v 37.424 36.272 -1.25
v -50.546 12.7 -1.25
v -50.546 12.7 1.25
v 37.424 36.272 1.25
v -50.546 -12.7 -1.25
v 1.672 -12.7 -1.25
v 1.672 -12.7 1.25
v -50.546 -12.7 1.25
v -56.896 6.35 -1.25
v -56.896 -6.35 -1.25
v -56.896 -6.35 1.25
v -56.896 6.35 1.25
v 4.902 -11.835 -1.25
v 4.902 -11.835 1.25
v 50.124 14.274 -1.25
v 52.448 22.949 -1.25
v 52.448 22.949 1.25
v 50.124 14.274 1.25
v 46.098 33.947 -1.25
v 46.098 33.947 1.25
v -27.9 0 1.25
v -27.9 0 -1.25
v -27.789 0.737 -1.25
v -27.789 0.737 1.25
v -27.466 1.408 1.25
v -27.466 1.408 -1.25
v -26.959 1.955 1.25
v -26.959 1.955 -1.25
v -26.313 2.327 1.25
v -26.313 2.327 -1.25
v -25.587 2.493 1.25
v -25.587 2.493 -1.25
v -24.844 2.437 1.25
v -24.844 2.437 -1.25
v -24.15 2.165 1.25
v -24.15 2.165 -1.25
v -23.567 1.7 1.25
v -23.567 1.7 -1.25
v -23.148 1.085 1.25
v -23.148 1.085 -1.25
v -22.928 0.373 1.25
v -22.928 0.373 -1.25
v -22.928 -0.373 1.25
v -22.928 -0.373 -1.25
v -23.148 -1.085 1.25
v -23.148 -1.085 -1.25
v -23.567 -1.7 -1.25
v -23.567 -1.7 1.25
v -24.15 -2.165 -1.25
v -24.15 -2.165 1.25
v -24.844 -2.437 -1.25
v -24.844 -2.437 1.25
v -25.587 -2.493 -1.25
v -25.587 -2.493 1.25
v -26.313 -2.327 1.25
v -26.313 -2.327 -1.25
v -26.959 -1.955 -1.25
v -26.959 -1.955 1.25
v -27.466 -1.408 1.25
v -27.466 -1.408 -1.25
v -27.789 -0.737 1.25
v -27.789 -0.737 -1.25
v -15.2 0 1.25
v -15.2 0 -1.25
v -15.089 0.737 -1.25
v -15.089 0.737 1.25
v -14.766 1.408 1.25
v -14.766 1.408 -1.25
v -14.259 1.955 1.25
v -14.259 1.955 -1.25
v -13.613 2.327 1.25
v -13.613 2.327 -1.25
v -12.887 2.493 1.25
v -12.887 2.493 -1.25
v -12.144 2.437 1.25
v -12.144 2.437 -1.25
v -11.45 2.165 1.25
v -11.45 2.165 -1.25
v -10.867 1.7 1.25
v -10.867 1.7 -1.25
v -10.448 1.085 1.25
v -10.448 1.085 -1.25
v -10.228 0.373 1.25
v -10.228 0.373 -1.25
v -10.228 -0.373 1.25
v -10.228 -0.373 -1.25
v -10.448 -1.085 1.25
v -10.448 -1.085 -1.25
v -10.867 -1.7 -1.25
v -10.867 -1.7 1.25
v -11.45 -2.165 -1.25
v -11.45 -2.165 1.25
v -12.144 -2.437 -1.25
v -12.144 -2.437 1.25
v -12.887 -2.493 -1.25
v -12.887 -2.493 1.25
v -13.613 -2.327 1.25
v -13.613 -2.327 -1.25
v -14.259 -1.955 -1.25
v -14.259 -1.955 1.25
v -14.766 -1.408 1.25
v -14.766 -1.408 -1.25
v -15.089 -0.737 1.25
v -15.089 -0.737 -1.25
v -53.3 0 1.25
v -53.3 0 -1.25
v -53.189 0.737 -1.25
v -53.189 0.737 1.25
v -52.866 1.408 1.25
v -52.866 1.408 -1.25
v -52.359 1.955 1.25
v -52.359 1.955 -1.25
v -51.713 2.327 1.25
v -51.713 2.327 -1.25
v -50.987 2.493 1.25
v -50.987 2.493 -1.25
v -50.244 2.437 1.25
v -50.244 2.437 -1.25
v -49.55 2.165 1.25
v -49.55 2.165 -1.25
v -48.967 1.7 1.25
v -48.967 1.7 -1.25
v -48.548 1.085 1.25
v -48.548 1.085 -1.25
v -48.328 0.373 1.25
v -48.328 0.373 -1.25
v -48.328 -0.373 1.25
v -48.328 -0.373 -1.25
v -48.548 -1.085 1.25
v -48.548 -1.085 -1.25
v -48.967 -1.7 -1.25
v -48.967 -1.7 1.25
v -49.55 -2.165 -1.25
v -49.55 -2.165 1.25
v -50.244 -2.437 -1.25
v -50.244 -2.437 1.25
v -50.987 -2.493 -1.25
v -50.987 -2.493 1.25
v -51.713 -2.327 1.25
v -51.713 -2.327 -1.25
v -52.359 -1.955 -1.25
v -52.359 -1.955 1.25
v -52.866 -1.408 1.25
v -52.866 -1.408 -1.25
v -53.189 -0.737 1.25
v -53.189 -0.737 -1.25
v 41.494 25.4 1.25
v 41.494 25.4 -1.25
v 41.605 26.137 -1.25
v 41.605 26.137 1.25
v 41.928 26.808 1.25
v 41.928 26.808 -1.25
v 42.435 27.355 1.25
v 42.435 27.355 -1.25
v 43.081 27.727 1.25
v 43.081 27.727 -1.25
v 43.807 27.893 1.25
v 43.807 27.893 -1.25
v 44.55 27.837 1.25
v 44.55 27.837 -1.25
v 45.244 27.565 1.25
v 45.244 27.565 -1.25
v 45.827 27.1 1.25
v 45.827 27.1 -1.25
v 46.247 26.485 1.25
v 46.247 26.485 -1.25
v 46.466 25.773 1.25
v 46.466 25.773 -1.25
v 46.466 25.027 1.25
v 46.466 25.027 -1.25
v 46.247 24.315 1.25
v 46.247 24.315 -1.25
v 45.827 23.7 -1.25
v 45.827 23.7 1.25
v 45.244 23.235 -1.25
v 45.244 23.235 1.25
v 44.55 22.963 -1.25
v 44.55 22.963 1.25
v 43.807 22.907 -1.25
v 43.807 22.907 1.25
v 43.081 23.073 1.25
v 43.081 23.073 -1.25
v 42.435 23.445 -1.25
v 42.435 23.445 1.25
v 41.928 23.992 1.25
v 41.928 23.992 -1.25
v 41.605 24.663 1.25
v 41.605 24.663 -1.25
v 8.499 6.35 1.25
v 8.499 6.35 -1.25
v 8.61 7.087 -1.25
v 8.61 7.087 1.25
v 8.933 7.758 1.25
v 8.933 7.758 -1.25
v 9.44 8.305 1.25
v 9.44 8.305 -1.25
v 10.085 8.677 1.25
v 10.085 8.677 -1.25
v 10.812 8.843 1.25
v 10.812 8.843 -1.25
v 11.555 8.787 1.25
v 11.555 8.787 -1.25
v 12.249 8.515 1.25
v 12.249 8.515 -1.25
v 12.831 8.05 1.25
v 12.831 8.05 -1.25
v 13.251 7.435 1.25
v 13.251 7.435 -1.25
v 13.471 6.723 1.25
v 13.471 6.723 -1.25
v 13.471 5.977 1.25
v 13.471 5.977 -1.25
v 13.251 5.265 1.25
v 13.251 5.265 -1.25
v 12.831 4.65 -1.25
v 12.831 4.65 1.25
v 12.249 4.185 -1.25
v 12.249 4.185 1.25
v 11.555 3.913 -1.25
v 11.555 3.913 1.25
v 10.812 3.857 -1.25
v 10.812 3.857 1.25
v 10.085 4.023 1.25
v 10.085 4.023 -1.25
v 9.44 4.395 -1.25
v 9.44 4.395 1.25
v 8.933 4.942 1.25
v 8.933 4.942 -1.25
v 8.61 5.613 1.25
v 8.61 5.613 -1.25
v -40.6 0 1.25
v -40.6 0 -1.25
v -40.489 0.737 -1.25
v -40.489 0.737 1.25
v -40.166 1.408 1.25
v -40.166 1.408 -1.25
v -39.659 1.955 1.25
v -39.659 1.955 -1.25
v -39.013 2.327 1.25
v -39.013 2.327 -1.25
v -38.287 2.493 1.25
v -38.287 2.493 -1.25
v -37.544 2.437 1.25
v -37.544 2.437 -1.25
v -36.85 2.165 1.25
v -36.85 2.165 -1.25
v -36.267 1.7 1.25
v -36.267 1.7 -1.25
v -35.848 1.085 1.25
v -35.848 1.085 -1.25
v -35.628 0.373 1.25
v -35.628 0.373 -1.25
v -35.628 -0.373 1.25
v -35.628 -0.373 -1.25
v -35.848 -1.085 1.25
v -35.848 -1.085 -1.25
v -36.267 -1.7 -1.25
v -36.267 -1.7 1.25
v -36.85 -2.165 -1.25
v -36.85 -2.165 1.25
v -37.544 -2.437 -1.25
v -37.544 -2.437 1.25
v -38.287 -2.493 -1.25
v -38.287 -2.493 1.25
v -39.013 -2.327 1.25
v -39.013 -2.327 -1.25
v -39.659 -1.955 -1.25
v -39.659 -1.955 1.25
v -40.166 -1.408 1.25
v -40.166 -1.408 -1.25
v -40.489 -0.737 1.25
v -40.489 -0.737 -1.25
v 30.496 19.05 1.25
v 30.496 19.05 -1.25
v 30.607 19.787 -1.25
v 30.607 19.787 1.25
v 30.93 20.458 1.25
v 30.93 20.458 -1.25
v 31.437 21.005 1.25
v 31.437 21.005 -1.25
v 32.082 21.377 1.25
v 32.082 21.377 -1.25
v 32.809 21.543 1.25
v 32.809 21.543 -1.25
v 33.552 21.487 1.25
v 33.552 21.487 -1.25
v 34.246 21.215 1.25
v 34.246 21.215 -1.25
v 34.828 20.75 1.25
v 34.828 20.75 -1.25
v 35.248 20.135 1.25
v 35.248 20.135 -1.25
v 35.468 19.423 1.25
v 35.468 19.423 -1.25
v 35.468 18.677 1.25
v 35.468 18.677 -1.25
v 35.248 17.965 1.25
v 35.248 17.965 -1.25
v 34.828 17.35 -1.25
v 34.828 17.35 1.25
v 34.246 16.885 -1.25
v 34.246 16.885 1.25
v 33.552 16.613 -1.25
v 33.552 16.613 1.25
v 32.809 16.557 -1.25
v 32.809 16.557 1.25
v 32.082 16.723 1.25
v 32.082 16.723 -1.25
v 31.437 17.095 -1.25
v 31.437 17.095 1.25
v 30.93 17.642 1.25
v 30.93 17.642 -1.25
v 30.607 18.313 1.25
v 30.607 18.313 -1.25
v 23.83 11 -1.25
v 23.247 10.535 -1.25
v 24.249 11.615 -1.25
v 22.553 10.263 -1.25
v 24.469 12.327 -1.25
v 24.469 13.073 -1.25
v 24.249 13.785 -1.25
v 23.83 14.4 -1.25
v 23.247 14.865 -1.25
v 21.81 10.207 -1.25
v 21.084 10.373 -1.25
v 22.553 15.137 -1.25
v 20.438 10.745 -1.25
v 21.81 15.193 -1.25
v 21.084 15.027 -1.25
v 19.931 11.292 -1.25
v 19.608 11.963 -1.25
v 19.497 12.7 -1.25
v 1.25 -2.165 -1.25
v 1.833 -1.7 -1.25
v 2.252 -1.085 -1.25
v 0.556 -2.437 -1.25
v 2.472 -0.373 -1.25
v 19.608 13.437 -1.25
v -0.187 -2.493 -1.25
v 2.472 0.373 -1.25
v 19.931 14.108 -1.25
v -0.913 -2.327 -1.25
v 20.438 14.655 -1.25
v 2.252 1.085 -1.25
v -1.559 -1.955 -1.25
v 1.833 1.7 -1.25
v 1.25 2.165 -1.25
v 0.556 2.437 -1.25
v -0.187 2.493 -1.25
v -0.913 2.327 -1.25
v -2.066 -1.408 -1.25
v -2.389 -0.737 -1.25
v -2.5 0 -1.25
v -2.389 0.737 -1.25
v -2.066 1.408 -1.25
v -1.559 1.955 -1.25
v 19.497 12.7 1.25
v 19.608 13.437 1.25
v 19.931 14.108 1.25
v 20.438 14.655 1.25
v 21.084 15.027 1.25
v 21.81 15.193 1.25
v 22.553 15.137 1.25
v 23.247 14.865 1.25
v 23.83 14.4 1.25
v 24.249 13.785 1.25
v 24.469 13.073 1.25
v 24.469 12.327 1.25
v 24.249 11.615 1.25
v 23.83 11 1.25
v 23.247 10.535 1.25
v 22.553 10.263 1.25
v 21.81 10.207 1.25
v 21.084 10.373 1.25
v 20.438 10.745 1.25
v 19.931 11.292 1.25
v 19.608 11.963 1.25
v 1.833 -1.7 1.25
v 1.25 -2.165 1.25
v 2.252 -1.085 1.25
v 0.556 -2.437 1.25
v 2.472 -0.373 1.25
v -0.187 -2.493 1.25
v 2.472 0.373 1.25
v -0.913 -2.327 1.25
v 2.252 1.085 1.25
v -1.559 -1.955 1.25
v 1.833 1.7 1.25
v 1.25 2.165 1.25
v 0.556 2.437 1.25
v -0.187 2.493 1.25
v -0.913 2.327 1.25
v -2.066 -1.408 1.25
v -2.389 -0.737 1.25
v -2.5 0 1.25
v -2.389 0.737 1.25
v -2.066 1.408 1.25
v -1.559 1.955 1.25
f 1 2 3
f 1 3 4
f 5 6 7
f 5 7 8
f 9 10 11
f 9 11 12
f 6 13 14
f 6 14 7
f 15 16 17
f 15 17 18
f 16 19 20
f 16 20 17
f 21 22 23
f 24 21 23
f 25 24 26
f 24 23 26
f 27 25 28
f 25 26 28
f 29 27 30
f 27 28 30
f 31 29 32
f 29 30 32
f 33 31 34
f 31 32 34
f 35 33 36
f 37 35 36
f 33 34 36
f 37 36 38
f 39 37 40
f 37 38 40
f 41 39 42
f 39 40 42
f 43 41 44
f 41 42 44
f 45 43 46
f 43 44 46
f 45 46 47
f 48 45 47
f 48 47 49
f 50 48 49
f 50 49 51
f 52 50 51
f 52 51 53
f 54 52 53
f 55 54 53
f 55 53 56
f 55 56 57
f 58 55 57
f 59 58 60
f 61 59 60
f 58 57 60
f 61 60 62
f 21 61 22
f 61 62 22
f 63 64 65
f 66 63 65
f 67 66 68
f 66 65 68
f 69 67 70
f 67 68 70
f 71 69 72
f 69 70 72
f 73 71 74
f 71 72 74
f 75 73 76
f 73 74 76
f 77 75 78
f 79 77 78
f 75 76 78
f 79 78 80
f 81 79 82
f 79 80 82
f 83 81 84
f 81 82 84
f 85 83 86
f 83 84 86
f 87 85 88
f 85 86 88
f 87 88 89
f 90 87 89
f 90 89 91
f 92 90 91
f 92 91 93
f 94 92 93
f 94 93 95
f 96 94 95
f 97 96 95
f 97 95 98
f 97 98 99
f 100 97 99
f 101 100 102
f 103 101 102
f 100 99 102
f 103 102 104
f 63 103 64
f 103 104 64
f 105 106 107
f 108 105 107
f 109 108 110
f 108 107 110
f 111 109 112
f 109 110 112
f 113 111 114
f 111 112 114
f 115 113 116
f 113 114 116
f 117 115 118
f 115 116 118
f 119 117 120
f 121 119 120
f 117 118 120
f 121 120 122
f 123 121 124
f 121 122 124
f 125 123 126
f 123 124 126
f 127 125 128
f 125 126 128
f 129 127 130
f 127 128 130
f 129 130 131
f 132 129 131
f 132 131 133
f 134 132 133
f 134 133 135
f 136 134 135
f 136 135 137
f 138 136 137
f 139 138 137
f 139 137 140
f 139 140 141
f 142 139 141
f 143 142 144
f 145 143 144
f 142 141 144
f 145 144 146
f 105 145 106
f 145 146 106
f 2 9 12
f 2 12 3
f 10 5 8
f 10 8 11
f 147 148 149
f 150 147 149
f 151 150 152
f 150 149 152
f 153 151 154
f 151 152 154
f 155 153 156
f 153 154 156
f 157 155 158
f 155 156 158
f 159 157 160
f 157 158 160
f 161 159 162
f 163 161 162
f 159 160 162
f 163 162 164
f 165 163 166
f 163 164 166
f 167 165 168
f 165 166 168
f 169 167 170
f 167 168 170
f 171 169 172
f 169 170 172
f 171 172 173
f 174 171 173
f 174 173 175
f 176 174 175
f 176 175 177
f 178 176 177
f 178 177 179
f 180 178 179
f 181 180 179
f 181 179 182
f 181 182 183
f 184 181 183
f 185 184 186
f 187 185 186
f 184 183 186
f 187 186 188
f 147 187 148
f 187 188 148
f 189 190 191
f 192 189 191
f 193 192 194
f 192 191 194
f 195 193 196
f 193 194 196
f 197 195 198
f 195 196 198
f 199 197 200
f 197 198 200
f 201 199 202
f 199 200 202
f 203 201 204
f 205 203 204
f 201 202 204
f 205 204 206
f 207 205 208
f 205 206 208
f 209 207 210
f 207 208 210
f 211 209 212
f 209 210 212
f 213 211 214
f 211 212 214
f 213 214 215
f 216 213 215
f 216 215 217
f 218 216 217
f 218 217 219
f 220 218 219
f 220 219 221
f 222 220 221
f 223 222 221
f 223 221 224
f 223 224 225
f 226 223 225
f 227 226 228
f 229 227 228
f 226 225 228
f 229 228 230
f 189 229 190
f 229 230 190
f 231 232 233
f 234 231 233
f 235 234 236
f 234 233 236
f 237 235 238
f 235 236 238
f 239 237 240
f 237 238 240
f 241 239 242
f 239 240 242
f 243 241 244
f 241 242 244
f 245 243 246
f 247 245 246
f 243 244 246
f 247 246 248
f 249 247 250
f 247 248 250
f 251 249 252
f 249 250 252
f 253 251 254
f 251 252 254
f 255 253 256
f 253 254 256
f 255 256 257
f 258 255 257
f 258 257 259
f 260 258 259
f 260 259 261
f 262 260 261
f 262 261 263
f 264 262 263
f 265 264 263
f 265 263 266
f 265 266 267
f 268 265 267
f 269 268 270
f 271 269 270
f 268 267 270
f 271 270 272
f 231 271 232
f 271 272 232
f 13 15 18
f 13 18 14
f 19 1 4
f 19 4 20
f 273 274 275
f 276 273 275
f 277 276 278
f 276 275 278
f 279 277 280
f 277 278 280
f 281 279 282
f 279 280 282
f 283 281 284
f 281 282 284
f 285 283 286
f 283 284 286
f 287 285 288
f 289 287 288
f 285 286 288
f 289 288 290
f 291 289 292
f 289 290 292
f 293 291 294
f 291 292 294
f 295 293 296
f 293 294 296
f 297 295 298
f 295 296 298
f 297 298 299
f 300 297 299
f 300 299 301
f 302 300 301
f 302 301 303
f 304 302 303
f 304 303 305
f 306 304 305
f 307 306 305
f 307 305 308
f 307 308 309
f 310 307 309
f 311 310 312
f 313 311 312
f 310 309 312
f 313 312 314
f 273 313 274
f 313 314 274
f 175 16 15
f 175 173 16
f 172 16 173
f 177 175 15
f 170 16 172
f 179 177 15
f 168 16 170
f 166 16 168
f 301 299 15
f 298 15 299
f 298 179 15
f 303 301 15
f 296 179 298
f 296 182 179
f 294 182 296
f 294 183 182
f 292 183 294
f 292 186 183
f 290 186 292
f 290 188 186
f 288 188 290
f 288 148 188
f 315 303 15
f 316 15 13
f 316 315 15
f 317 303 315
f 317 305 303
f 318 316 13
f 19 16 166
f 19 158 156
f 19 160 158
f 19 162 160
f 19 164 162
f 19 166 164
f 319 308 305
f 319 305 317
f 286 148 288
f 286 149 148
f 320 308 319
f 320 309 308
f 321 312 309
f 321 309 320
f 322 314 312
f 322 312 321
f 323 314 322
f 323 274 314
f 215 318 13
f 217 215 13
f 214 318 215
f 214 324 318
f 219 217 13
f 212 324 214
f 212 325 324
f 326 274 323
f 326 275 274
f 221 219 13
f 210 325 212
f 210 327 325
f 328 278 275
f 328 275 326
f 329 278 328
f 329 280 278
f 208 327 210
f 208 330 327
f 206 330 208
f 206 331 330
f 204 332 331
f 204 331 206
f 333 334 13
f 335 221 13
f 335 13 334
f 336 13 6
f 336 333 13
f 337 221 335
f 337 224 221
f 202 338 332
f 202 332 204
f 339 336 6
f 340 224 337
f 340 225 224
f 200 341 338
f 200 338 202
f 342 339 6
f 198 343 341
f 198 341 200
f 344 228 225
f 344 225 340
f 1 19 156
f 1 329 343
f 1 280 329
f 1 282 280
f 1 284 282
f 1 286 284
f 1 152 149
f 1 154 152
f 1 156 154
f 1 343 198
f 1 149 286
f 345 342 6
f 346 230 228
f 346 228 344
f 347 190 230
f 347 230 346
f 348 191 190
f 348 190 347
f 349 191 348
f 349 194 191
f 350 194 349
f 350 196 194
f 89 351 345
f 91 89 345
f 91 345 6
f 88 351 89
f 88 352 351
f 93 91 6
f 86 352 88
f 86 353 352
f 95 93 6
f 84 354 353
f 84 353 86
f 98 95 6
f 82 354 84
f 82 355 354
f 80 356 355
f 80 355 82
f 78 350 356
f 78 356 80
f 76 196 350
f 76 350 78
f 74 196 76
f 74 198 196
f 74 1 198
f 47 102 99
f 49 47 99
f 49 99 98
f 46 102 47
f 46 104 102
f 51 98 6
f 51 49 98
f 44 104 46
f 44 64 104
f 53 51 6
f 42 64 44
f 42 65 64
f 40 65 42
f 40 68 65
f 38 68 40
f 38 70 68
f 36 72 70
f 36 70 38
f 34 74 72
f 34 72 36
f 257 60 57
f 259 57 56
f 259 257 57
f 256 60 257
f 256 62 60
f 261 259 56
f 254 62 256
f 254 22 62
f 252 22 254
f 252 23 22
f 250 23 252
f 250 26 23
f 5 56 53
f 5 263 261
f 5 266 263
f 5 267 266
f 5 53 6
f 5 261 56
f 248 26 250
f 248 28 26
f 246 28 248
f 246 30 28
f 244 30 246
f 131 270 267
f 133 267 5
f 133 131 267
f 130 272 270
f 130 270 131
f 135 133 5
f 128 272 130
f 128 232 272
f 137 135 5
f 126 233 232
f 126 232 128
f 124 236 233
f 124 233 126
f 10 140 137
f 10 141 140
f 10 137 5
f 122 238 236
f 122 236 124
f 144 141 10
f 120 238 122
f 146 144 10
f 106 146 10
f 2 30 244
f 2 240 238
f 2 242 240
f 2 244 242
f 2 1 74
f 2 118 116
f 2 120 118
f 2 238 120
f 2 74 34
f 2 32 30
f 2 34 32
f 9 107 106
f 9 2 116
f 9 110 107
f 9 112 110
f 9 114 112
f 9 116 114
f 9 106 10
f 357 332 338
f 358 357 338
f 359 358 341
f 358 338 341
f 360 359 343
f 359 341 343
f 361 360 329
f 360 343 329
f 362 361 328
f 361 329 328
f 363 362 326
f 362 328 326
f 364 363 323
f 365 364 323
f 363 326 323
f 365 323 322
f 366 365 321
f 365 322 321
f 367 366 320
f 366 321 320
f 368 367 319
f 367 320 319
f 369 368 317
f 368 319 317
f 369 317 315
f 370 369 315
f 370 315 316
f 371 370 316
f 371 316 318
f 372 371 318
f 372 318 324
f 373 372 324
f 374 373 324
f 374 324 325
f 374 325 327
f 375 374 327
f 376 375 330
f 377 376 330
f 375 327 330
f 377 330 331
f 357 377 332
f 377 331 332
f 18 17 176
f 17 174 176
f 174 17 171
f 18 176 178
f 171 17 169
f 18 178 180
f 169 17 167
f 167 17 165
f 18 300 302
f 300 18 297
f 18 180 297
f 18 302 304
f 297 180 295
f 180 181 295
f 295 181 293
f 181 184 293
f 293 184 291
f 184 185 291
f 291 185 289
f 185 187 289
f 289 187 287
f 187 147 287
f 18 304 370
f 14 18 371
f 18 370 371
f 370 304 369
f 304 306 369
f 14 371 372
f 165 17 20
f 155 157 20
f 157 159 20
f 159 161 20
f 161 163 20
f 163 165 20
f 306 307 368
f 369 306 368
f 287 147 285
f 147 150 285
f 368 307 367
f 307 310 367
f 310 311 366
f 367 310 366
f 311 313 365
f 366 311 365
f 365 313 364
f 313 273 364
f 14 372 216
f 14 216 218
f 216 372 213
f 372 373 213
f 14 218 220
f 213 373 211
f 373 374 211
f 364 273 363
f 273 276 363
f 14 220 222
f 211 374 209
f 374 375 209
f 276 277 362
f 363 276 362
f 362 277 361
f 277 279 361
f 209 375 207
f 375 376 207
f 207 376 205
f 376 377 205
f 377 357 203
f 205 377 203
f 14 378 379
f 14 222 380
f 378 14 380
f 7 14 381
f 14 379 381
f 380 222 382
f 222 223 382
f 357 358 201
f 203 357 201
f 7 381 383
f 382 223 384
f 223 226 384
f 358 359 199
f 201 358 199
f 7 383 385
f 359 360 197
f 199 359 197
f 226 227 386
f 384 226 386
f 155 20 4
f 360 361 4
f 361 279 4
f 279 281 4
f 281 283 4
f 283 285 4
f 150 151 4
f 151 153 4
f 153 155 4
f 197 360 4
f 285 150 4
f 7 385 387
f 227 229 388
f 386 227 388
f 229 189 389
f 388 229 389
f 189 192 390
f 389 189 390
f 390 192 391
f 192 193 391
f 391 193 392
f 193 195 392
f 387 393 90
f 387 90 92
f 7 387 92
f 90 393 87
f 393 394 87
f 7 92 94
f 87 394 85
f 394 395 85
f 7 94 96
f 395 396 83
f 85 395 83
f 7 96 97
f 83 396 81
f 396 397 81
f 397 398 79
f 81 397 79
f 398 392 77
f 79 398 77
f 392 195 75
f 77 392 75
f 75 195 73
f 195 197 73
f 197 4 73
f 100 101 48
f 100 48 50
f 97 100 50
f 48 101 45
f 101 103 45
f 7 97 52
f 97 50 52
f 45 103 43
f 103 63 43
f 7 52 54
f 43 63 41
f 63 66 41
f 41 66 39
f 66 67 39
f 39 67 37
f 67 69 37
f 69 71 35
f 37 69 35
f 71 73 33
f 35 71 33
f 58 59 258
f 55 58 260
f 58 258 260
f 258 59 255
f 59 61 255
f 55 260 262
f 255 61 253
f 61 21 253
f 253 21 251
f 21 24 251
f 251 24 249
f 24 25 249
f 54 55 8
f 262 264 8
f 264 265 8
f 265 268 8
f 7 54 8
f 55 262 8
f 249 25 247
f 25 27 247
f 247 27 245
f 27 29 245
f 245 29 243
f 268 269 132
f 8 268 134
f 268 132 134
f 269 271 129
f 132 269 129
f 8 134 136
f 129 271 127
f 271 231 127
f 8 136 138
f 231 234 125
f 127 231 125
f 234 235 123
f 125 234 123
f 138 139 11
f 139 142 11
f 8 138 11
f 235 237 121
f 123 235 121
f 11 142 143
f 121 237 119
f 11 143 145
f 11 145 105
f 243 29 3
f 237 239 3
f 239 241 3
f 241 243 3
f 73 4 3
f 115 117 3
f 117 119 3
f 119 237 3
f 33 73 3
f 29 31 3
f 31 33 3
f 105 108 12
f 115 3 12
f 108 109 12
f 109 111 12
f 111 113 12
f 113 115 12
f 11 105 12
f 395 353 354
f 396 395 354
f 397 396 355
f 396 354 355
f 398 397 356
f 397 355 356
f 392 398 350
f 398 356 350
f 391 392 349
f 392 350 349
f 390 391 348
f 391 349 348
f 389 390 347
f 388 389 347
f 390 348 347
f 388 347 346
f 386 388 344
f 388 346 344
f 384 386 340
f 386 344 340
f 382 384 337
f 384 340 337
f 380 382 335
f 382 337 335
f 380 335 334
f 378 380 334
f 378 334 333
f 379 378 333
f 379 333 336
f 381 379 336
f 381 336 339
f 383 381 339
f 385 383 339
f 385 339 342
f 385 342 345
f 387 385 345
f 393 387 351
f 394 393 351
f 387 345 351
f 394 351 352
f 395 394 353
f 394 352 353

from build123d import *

# Parameters (mm, degrees)
SKETCH1_R           = 2.5
BOSS_EXTRUDE1_DEPTH = 2.5


with BuildPart() as part:
    # Sketch1 → Boss-Extrude1 (new body)
    with BuildSketch(Plane(origin=(0, 0, -1.25), x_dir=(-1, 0, 0), z_dir=(0, 0, -1))):
        Polygon((50.546, 12.7), (-37.42412006, 36.271522628), (-46.098381374, 33.947261314), (-52.448381374, 22.948738686), (-50.12412006, 14.274477372), (-4.902017026, -11.834515988), (-1.671986719, -12.7), (50.546, -12.7), (56.896, -6.35), (56.896, 6.35), align=None)
        with Locations((12.7, 0)):
            Circle(SKETCH1_R, mode=Mode.SUBTRACT)
        with Locations((25.4, 0)):
            Circle(SKETCH1_R, mode=Mode.SUBTRACT)
        Circle(SKETCH1_R, mode=Mode.SUBTRACT)
        with Locations((50.8, 0)):
            Circle(SKETCH1_R, mode=Mode.SUBTRACT)
        with Locations((38.1, 0)):
            Circle(SKETCH1_R, mode=Mode.SUBTRACT)
        with Locations((-43.994090512, 25.4)):
            Circle(SKETCH1_R, mode=Mode.SUBTRACT)
        with Locations((-32.995567884, 19.05)):
            Circle(SKETCH1_R, mode=Mode.SUBTRACT)
        with Locations((-21.997045256, 12.7)):
            Circle(SKETCH1_R, mode=Mode.SUBTRACT)
        with Locations((-10.998522628, 6.35)):
            Circle(SKETCH1_R, mode=Mode.SUBTRACT)
    extrude(amount=-BOSS_EXTRUDE1_DEPTH)


solid = part.part
